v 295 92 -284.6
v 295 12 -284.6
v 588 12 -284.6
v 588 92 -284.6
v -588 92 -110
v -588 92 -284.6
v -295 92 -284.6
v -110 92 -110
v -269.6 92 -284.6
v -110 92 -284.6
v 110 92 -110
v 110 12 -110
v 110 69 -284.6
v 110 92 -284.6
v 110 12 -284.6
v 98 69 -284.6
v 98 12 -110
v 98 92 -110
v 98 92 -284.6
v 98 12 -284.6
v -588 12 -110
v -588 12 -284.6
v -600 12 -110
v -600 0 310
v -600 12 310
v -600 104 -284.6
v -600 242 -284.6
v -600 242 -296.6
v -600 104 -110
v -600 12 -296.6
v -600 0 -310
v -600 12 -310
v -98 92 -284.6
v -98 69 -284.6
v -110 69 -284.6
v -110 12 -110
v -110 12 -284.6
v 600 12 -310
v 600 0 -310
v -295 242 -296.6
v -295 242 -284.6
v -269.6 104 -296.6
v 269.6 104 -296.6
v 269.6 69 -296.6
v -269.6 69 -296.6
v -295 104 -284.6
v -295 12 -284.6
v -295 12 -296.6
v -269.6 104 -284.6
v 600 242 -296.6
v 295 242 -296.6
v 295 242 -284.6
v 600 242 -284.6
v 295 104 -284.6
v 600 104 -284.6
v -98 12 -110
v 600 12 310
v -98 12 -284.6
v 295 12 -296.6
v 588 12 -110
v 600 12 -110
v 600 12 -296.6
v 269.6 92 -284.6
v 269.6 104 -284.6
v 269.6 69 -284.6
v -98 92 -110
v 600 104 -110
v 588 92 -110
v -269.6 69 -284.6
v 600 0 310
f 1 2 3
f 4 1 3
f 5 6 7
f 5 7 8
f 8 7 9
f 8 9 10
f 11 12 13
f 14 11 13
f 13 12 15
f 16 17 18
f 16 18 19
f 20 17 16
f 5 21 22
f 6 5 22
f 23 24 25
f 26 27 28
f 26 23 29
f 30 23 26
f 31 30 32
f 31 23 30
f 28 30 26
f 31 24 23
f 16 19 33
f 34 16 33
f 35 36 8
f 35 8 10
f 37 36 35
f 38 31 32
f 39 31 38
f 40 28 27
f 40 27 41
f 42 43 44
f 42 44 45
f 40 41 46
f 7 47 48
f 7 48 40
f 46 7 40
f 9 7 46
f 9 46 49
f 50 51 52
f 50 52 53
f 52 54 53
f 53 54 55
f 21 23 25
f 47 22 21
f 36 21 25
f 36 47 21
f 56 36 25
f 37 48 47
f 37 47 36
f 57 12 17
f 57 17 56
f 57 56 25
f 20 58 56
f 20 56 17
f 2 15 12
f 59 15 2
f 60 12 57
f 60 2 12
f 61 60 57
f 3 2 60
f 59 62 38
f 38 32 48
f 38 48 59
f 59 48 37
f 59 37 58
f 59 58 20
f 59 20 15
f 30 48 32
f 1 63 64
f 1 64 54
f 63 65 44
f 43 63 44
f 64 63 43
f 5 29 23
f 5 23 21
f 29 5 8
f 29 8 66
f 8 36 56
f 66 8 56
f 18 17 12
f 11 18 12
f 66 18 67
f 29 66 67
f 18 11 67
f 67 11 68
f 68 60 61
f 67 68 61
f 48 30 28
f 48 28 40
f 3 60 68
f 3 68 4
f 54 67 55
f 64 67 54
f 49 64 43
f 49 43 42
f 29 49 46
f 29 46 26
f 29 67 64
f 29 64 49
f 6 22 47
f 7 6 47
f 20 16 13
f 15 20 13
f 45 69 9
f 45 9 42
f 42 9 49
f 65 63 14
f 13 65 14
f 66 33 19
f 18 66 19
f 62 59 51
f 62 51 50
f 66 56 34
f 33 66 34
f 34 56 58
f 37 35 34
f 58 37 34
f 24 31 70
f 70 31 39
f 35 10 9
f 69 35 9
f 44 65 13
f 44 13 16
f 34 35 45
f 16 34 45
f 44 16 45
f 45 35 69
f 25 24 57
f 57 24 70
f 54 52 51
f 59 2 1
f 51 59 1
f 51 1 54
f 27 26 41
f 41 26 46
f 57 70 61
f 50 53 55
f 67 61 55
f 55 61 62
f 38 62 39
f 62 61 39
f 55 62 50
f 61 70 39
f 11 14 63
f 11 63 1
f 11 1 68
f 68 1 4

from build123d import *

# Parameters (mm, degrees)
SKETCH1_W           = 1200
SKETCH1_H           = 620
BOSS_EXTRUDE1_DEPTH = 12
SKETCH2_W           = 12
SKETCH2_H           = 174.6
BOSS_EXTRUDE2_DEPTH = 80
SKETCH6_W           = 1200
SKETCH6_H           = 174.6
BOSS_EXTRUDE5_DEPTH = 12
SKETCH7_W           = 305
SKETCH7_H           = 12
BOSS_EXTRUDE6_DEPTH = 230
SKETCH8_W           = 539.2
SKETCH8_H           = 35
BOSS_EXTRUDE7_DEPTH = 12


with BuildPart() as part:
    # Sketch1 → Boss-Extrude1 (new body)
    with BuildSketch(Plane(origin=(0, 0, 0), x_dir=(1, 0, 0), z_dir=(0, 1, 0))):
        Rectangle(SKETCH1_W, SKETCH1_H)
    extrude(amount=BOSS_EXTRUDE1_DEPTH)

    # Sketch2 → Boss-Extrude2 (add)
    with BuildSketch(Plane(origin=(0, 12, 0), x_dir=(1, 0, 0), z_dir=(0, 1, 0))):
        with Locations((-594, 197.3)):
            Rectangle(SKETCH2_W, SKETCH2_H)
        with Locations((-104, 197.3)):
            Rectangle(SKETCH2_W, SKETCH2_H)
        with Locations((104, 197.3)):
            Rectangle(SKETCH2_W, SKETCH2_H)
        with Locations((594, 197.3)):
            Rectangle(SKETCH2_W, SKETCH2_H)
    extrude(amount=BOSS_EXTRUDE2_DEPTH)

    # Sketch6 → Boss-Extrude5 (add)
    with BuildSketch(Plane(origin=(0, 92, 0), x_dir=(1, 0, 0), z_dir=(0, 1, 0))):
        with Locations((0, 197.3)):
            Rectangle(SKETCH6_W, SKETCH6_H)
    extrude(amount=BOSS_EXTRUDE5_DEPTH)

    # Sketch7 → Boss-Extrude6 (add)
    with BuildSketch(Plane(origin=(0, 12, 0), x_dir=(1, 0, 0), z_dir=(0, 1, 0))):
        with Locations((-447.5, 290.6)):
            Rectangle(SKETCH7_W, SKETCH7_H)
        with Locations((447.5, 290.6)):
            Rectangle(SKETCH7_W, SKETCH7_H)
    extrude(amount=BOSS_EXTRUDE6_DEPTH)

    # Sketch8 → Boss-Extrude7 (add)
    with BuildSketch(Plane(origin=(0, 0, -284.6), x_dir=(-1, 0, 0), z_dir=(0, 0, -1))):
        with Locations((0, 86.5)):
            Rectangle(SKETCH8_W, SKETCH8_H)
    extrude(amount=BOSS_EXTRUDE7_DEPTH)


solid = part.part
